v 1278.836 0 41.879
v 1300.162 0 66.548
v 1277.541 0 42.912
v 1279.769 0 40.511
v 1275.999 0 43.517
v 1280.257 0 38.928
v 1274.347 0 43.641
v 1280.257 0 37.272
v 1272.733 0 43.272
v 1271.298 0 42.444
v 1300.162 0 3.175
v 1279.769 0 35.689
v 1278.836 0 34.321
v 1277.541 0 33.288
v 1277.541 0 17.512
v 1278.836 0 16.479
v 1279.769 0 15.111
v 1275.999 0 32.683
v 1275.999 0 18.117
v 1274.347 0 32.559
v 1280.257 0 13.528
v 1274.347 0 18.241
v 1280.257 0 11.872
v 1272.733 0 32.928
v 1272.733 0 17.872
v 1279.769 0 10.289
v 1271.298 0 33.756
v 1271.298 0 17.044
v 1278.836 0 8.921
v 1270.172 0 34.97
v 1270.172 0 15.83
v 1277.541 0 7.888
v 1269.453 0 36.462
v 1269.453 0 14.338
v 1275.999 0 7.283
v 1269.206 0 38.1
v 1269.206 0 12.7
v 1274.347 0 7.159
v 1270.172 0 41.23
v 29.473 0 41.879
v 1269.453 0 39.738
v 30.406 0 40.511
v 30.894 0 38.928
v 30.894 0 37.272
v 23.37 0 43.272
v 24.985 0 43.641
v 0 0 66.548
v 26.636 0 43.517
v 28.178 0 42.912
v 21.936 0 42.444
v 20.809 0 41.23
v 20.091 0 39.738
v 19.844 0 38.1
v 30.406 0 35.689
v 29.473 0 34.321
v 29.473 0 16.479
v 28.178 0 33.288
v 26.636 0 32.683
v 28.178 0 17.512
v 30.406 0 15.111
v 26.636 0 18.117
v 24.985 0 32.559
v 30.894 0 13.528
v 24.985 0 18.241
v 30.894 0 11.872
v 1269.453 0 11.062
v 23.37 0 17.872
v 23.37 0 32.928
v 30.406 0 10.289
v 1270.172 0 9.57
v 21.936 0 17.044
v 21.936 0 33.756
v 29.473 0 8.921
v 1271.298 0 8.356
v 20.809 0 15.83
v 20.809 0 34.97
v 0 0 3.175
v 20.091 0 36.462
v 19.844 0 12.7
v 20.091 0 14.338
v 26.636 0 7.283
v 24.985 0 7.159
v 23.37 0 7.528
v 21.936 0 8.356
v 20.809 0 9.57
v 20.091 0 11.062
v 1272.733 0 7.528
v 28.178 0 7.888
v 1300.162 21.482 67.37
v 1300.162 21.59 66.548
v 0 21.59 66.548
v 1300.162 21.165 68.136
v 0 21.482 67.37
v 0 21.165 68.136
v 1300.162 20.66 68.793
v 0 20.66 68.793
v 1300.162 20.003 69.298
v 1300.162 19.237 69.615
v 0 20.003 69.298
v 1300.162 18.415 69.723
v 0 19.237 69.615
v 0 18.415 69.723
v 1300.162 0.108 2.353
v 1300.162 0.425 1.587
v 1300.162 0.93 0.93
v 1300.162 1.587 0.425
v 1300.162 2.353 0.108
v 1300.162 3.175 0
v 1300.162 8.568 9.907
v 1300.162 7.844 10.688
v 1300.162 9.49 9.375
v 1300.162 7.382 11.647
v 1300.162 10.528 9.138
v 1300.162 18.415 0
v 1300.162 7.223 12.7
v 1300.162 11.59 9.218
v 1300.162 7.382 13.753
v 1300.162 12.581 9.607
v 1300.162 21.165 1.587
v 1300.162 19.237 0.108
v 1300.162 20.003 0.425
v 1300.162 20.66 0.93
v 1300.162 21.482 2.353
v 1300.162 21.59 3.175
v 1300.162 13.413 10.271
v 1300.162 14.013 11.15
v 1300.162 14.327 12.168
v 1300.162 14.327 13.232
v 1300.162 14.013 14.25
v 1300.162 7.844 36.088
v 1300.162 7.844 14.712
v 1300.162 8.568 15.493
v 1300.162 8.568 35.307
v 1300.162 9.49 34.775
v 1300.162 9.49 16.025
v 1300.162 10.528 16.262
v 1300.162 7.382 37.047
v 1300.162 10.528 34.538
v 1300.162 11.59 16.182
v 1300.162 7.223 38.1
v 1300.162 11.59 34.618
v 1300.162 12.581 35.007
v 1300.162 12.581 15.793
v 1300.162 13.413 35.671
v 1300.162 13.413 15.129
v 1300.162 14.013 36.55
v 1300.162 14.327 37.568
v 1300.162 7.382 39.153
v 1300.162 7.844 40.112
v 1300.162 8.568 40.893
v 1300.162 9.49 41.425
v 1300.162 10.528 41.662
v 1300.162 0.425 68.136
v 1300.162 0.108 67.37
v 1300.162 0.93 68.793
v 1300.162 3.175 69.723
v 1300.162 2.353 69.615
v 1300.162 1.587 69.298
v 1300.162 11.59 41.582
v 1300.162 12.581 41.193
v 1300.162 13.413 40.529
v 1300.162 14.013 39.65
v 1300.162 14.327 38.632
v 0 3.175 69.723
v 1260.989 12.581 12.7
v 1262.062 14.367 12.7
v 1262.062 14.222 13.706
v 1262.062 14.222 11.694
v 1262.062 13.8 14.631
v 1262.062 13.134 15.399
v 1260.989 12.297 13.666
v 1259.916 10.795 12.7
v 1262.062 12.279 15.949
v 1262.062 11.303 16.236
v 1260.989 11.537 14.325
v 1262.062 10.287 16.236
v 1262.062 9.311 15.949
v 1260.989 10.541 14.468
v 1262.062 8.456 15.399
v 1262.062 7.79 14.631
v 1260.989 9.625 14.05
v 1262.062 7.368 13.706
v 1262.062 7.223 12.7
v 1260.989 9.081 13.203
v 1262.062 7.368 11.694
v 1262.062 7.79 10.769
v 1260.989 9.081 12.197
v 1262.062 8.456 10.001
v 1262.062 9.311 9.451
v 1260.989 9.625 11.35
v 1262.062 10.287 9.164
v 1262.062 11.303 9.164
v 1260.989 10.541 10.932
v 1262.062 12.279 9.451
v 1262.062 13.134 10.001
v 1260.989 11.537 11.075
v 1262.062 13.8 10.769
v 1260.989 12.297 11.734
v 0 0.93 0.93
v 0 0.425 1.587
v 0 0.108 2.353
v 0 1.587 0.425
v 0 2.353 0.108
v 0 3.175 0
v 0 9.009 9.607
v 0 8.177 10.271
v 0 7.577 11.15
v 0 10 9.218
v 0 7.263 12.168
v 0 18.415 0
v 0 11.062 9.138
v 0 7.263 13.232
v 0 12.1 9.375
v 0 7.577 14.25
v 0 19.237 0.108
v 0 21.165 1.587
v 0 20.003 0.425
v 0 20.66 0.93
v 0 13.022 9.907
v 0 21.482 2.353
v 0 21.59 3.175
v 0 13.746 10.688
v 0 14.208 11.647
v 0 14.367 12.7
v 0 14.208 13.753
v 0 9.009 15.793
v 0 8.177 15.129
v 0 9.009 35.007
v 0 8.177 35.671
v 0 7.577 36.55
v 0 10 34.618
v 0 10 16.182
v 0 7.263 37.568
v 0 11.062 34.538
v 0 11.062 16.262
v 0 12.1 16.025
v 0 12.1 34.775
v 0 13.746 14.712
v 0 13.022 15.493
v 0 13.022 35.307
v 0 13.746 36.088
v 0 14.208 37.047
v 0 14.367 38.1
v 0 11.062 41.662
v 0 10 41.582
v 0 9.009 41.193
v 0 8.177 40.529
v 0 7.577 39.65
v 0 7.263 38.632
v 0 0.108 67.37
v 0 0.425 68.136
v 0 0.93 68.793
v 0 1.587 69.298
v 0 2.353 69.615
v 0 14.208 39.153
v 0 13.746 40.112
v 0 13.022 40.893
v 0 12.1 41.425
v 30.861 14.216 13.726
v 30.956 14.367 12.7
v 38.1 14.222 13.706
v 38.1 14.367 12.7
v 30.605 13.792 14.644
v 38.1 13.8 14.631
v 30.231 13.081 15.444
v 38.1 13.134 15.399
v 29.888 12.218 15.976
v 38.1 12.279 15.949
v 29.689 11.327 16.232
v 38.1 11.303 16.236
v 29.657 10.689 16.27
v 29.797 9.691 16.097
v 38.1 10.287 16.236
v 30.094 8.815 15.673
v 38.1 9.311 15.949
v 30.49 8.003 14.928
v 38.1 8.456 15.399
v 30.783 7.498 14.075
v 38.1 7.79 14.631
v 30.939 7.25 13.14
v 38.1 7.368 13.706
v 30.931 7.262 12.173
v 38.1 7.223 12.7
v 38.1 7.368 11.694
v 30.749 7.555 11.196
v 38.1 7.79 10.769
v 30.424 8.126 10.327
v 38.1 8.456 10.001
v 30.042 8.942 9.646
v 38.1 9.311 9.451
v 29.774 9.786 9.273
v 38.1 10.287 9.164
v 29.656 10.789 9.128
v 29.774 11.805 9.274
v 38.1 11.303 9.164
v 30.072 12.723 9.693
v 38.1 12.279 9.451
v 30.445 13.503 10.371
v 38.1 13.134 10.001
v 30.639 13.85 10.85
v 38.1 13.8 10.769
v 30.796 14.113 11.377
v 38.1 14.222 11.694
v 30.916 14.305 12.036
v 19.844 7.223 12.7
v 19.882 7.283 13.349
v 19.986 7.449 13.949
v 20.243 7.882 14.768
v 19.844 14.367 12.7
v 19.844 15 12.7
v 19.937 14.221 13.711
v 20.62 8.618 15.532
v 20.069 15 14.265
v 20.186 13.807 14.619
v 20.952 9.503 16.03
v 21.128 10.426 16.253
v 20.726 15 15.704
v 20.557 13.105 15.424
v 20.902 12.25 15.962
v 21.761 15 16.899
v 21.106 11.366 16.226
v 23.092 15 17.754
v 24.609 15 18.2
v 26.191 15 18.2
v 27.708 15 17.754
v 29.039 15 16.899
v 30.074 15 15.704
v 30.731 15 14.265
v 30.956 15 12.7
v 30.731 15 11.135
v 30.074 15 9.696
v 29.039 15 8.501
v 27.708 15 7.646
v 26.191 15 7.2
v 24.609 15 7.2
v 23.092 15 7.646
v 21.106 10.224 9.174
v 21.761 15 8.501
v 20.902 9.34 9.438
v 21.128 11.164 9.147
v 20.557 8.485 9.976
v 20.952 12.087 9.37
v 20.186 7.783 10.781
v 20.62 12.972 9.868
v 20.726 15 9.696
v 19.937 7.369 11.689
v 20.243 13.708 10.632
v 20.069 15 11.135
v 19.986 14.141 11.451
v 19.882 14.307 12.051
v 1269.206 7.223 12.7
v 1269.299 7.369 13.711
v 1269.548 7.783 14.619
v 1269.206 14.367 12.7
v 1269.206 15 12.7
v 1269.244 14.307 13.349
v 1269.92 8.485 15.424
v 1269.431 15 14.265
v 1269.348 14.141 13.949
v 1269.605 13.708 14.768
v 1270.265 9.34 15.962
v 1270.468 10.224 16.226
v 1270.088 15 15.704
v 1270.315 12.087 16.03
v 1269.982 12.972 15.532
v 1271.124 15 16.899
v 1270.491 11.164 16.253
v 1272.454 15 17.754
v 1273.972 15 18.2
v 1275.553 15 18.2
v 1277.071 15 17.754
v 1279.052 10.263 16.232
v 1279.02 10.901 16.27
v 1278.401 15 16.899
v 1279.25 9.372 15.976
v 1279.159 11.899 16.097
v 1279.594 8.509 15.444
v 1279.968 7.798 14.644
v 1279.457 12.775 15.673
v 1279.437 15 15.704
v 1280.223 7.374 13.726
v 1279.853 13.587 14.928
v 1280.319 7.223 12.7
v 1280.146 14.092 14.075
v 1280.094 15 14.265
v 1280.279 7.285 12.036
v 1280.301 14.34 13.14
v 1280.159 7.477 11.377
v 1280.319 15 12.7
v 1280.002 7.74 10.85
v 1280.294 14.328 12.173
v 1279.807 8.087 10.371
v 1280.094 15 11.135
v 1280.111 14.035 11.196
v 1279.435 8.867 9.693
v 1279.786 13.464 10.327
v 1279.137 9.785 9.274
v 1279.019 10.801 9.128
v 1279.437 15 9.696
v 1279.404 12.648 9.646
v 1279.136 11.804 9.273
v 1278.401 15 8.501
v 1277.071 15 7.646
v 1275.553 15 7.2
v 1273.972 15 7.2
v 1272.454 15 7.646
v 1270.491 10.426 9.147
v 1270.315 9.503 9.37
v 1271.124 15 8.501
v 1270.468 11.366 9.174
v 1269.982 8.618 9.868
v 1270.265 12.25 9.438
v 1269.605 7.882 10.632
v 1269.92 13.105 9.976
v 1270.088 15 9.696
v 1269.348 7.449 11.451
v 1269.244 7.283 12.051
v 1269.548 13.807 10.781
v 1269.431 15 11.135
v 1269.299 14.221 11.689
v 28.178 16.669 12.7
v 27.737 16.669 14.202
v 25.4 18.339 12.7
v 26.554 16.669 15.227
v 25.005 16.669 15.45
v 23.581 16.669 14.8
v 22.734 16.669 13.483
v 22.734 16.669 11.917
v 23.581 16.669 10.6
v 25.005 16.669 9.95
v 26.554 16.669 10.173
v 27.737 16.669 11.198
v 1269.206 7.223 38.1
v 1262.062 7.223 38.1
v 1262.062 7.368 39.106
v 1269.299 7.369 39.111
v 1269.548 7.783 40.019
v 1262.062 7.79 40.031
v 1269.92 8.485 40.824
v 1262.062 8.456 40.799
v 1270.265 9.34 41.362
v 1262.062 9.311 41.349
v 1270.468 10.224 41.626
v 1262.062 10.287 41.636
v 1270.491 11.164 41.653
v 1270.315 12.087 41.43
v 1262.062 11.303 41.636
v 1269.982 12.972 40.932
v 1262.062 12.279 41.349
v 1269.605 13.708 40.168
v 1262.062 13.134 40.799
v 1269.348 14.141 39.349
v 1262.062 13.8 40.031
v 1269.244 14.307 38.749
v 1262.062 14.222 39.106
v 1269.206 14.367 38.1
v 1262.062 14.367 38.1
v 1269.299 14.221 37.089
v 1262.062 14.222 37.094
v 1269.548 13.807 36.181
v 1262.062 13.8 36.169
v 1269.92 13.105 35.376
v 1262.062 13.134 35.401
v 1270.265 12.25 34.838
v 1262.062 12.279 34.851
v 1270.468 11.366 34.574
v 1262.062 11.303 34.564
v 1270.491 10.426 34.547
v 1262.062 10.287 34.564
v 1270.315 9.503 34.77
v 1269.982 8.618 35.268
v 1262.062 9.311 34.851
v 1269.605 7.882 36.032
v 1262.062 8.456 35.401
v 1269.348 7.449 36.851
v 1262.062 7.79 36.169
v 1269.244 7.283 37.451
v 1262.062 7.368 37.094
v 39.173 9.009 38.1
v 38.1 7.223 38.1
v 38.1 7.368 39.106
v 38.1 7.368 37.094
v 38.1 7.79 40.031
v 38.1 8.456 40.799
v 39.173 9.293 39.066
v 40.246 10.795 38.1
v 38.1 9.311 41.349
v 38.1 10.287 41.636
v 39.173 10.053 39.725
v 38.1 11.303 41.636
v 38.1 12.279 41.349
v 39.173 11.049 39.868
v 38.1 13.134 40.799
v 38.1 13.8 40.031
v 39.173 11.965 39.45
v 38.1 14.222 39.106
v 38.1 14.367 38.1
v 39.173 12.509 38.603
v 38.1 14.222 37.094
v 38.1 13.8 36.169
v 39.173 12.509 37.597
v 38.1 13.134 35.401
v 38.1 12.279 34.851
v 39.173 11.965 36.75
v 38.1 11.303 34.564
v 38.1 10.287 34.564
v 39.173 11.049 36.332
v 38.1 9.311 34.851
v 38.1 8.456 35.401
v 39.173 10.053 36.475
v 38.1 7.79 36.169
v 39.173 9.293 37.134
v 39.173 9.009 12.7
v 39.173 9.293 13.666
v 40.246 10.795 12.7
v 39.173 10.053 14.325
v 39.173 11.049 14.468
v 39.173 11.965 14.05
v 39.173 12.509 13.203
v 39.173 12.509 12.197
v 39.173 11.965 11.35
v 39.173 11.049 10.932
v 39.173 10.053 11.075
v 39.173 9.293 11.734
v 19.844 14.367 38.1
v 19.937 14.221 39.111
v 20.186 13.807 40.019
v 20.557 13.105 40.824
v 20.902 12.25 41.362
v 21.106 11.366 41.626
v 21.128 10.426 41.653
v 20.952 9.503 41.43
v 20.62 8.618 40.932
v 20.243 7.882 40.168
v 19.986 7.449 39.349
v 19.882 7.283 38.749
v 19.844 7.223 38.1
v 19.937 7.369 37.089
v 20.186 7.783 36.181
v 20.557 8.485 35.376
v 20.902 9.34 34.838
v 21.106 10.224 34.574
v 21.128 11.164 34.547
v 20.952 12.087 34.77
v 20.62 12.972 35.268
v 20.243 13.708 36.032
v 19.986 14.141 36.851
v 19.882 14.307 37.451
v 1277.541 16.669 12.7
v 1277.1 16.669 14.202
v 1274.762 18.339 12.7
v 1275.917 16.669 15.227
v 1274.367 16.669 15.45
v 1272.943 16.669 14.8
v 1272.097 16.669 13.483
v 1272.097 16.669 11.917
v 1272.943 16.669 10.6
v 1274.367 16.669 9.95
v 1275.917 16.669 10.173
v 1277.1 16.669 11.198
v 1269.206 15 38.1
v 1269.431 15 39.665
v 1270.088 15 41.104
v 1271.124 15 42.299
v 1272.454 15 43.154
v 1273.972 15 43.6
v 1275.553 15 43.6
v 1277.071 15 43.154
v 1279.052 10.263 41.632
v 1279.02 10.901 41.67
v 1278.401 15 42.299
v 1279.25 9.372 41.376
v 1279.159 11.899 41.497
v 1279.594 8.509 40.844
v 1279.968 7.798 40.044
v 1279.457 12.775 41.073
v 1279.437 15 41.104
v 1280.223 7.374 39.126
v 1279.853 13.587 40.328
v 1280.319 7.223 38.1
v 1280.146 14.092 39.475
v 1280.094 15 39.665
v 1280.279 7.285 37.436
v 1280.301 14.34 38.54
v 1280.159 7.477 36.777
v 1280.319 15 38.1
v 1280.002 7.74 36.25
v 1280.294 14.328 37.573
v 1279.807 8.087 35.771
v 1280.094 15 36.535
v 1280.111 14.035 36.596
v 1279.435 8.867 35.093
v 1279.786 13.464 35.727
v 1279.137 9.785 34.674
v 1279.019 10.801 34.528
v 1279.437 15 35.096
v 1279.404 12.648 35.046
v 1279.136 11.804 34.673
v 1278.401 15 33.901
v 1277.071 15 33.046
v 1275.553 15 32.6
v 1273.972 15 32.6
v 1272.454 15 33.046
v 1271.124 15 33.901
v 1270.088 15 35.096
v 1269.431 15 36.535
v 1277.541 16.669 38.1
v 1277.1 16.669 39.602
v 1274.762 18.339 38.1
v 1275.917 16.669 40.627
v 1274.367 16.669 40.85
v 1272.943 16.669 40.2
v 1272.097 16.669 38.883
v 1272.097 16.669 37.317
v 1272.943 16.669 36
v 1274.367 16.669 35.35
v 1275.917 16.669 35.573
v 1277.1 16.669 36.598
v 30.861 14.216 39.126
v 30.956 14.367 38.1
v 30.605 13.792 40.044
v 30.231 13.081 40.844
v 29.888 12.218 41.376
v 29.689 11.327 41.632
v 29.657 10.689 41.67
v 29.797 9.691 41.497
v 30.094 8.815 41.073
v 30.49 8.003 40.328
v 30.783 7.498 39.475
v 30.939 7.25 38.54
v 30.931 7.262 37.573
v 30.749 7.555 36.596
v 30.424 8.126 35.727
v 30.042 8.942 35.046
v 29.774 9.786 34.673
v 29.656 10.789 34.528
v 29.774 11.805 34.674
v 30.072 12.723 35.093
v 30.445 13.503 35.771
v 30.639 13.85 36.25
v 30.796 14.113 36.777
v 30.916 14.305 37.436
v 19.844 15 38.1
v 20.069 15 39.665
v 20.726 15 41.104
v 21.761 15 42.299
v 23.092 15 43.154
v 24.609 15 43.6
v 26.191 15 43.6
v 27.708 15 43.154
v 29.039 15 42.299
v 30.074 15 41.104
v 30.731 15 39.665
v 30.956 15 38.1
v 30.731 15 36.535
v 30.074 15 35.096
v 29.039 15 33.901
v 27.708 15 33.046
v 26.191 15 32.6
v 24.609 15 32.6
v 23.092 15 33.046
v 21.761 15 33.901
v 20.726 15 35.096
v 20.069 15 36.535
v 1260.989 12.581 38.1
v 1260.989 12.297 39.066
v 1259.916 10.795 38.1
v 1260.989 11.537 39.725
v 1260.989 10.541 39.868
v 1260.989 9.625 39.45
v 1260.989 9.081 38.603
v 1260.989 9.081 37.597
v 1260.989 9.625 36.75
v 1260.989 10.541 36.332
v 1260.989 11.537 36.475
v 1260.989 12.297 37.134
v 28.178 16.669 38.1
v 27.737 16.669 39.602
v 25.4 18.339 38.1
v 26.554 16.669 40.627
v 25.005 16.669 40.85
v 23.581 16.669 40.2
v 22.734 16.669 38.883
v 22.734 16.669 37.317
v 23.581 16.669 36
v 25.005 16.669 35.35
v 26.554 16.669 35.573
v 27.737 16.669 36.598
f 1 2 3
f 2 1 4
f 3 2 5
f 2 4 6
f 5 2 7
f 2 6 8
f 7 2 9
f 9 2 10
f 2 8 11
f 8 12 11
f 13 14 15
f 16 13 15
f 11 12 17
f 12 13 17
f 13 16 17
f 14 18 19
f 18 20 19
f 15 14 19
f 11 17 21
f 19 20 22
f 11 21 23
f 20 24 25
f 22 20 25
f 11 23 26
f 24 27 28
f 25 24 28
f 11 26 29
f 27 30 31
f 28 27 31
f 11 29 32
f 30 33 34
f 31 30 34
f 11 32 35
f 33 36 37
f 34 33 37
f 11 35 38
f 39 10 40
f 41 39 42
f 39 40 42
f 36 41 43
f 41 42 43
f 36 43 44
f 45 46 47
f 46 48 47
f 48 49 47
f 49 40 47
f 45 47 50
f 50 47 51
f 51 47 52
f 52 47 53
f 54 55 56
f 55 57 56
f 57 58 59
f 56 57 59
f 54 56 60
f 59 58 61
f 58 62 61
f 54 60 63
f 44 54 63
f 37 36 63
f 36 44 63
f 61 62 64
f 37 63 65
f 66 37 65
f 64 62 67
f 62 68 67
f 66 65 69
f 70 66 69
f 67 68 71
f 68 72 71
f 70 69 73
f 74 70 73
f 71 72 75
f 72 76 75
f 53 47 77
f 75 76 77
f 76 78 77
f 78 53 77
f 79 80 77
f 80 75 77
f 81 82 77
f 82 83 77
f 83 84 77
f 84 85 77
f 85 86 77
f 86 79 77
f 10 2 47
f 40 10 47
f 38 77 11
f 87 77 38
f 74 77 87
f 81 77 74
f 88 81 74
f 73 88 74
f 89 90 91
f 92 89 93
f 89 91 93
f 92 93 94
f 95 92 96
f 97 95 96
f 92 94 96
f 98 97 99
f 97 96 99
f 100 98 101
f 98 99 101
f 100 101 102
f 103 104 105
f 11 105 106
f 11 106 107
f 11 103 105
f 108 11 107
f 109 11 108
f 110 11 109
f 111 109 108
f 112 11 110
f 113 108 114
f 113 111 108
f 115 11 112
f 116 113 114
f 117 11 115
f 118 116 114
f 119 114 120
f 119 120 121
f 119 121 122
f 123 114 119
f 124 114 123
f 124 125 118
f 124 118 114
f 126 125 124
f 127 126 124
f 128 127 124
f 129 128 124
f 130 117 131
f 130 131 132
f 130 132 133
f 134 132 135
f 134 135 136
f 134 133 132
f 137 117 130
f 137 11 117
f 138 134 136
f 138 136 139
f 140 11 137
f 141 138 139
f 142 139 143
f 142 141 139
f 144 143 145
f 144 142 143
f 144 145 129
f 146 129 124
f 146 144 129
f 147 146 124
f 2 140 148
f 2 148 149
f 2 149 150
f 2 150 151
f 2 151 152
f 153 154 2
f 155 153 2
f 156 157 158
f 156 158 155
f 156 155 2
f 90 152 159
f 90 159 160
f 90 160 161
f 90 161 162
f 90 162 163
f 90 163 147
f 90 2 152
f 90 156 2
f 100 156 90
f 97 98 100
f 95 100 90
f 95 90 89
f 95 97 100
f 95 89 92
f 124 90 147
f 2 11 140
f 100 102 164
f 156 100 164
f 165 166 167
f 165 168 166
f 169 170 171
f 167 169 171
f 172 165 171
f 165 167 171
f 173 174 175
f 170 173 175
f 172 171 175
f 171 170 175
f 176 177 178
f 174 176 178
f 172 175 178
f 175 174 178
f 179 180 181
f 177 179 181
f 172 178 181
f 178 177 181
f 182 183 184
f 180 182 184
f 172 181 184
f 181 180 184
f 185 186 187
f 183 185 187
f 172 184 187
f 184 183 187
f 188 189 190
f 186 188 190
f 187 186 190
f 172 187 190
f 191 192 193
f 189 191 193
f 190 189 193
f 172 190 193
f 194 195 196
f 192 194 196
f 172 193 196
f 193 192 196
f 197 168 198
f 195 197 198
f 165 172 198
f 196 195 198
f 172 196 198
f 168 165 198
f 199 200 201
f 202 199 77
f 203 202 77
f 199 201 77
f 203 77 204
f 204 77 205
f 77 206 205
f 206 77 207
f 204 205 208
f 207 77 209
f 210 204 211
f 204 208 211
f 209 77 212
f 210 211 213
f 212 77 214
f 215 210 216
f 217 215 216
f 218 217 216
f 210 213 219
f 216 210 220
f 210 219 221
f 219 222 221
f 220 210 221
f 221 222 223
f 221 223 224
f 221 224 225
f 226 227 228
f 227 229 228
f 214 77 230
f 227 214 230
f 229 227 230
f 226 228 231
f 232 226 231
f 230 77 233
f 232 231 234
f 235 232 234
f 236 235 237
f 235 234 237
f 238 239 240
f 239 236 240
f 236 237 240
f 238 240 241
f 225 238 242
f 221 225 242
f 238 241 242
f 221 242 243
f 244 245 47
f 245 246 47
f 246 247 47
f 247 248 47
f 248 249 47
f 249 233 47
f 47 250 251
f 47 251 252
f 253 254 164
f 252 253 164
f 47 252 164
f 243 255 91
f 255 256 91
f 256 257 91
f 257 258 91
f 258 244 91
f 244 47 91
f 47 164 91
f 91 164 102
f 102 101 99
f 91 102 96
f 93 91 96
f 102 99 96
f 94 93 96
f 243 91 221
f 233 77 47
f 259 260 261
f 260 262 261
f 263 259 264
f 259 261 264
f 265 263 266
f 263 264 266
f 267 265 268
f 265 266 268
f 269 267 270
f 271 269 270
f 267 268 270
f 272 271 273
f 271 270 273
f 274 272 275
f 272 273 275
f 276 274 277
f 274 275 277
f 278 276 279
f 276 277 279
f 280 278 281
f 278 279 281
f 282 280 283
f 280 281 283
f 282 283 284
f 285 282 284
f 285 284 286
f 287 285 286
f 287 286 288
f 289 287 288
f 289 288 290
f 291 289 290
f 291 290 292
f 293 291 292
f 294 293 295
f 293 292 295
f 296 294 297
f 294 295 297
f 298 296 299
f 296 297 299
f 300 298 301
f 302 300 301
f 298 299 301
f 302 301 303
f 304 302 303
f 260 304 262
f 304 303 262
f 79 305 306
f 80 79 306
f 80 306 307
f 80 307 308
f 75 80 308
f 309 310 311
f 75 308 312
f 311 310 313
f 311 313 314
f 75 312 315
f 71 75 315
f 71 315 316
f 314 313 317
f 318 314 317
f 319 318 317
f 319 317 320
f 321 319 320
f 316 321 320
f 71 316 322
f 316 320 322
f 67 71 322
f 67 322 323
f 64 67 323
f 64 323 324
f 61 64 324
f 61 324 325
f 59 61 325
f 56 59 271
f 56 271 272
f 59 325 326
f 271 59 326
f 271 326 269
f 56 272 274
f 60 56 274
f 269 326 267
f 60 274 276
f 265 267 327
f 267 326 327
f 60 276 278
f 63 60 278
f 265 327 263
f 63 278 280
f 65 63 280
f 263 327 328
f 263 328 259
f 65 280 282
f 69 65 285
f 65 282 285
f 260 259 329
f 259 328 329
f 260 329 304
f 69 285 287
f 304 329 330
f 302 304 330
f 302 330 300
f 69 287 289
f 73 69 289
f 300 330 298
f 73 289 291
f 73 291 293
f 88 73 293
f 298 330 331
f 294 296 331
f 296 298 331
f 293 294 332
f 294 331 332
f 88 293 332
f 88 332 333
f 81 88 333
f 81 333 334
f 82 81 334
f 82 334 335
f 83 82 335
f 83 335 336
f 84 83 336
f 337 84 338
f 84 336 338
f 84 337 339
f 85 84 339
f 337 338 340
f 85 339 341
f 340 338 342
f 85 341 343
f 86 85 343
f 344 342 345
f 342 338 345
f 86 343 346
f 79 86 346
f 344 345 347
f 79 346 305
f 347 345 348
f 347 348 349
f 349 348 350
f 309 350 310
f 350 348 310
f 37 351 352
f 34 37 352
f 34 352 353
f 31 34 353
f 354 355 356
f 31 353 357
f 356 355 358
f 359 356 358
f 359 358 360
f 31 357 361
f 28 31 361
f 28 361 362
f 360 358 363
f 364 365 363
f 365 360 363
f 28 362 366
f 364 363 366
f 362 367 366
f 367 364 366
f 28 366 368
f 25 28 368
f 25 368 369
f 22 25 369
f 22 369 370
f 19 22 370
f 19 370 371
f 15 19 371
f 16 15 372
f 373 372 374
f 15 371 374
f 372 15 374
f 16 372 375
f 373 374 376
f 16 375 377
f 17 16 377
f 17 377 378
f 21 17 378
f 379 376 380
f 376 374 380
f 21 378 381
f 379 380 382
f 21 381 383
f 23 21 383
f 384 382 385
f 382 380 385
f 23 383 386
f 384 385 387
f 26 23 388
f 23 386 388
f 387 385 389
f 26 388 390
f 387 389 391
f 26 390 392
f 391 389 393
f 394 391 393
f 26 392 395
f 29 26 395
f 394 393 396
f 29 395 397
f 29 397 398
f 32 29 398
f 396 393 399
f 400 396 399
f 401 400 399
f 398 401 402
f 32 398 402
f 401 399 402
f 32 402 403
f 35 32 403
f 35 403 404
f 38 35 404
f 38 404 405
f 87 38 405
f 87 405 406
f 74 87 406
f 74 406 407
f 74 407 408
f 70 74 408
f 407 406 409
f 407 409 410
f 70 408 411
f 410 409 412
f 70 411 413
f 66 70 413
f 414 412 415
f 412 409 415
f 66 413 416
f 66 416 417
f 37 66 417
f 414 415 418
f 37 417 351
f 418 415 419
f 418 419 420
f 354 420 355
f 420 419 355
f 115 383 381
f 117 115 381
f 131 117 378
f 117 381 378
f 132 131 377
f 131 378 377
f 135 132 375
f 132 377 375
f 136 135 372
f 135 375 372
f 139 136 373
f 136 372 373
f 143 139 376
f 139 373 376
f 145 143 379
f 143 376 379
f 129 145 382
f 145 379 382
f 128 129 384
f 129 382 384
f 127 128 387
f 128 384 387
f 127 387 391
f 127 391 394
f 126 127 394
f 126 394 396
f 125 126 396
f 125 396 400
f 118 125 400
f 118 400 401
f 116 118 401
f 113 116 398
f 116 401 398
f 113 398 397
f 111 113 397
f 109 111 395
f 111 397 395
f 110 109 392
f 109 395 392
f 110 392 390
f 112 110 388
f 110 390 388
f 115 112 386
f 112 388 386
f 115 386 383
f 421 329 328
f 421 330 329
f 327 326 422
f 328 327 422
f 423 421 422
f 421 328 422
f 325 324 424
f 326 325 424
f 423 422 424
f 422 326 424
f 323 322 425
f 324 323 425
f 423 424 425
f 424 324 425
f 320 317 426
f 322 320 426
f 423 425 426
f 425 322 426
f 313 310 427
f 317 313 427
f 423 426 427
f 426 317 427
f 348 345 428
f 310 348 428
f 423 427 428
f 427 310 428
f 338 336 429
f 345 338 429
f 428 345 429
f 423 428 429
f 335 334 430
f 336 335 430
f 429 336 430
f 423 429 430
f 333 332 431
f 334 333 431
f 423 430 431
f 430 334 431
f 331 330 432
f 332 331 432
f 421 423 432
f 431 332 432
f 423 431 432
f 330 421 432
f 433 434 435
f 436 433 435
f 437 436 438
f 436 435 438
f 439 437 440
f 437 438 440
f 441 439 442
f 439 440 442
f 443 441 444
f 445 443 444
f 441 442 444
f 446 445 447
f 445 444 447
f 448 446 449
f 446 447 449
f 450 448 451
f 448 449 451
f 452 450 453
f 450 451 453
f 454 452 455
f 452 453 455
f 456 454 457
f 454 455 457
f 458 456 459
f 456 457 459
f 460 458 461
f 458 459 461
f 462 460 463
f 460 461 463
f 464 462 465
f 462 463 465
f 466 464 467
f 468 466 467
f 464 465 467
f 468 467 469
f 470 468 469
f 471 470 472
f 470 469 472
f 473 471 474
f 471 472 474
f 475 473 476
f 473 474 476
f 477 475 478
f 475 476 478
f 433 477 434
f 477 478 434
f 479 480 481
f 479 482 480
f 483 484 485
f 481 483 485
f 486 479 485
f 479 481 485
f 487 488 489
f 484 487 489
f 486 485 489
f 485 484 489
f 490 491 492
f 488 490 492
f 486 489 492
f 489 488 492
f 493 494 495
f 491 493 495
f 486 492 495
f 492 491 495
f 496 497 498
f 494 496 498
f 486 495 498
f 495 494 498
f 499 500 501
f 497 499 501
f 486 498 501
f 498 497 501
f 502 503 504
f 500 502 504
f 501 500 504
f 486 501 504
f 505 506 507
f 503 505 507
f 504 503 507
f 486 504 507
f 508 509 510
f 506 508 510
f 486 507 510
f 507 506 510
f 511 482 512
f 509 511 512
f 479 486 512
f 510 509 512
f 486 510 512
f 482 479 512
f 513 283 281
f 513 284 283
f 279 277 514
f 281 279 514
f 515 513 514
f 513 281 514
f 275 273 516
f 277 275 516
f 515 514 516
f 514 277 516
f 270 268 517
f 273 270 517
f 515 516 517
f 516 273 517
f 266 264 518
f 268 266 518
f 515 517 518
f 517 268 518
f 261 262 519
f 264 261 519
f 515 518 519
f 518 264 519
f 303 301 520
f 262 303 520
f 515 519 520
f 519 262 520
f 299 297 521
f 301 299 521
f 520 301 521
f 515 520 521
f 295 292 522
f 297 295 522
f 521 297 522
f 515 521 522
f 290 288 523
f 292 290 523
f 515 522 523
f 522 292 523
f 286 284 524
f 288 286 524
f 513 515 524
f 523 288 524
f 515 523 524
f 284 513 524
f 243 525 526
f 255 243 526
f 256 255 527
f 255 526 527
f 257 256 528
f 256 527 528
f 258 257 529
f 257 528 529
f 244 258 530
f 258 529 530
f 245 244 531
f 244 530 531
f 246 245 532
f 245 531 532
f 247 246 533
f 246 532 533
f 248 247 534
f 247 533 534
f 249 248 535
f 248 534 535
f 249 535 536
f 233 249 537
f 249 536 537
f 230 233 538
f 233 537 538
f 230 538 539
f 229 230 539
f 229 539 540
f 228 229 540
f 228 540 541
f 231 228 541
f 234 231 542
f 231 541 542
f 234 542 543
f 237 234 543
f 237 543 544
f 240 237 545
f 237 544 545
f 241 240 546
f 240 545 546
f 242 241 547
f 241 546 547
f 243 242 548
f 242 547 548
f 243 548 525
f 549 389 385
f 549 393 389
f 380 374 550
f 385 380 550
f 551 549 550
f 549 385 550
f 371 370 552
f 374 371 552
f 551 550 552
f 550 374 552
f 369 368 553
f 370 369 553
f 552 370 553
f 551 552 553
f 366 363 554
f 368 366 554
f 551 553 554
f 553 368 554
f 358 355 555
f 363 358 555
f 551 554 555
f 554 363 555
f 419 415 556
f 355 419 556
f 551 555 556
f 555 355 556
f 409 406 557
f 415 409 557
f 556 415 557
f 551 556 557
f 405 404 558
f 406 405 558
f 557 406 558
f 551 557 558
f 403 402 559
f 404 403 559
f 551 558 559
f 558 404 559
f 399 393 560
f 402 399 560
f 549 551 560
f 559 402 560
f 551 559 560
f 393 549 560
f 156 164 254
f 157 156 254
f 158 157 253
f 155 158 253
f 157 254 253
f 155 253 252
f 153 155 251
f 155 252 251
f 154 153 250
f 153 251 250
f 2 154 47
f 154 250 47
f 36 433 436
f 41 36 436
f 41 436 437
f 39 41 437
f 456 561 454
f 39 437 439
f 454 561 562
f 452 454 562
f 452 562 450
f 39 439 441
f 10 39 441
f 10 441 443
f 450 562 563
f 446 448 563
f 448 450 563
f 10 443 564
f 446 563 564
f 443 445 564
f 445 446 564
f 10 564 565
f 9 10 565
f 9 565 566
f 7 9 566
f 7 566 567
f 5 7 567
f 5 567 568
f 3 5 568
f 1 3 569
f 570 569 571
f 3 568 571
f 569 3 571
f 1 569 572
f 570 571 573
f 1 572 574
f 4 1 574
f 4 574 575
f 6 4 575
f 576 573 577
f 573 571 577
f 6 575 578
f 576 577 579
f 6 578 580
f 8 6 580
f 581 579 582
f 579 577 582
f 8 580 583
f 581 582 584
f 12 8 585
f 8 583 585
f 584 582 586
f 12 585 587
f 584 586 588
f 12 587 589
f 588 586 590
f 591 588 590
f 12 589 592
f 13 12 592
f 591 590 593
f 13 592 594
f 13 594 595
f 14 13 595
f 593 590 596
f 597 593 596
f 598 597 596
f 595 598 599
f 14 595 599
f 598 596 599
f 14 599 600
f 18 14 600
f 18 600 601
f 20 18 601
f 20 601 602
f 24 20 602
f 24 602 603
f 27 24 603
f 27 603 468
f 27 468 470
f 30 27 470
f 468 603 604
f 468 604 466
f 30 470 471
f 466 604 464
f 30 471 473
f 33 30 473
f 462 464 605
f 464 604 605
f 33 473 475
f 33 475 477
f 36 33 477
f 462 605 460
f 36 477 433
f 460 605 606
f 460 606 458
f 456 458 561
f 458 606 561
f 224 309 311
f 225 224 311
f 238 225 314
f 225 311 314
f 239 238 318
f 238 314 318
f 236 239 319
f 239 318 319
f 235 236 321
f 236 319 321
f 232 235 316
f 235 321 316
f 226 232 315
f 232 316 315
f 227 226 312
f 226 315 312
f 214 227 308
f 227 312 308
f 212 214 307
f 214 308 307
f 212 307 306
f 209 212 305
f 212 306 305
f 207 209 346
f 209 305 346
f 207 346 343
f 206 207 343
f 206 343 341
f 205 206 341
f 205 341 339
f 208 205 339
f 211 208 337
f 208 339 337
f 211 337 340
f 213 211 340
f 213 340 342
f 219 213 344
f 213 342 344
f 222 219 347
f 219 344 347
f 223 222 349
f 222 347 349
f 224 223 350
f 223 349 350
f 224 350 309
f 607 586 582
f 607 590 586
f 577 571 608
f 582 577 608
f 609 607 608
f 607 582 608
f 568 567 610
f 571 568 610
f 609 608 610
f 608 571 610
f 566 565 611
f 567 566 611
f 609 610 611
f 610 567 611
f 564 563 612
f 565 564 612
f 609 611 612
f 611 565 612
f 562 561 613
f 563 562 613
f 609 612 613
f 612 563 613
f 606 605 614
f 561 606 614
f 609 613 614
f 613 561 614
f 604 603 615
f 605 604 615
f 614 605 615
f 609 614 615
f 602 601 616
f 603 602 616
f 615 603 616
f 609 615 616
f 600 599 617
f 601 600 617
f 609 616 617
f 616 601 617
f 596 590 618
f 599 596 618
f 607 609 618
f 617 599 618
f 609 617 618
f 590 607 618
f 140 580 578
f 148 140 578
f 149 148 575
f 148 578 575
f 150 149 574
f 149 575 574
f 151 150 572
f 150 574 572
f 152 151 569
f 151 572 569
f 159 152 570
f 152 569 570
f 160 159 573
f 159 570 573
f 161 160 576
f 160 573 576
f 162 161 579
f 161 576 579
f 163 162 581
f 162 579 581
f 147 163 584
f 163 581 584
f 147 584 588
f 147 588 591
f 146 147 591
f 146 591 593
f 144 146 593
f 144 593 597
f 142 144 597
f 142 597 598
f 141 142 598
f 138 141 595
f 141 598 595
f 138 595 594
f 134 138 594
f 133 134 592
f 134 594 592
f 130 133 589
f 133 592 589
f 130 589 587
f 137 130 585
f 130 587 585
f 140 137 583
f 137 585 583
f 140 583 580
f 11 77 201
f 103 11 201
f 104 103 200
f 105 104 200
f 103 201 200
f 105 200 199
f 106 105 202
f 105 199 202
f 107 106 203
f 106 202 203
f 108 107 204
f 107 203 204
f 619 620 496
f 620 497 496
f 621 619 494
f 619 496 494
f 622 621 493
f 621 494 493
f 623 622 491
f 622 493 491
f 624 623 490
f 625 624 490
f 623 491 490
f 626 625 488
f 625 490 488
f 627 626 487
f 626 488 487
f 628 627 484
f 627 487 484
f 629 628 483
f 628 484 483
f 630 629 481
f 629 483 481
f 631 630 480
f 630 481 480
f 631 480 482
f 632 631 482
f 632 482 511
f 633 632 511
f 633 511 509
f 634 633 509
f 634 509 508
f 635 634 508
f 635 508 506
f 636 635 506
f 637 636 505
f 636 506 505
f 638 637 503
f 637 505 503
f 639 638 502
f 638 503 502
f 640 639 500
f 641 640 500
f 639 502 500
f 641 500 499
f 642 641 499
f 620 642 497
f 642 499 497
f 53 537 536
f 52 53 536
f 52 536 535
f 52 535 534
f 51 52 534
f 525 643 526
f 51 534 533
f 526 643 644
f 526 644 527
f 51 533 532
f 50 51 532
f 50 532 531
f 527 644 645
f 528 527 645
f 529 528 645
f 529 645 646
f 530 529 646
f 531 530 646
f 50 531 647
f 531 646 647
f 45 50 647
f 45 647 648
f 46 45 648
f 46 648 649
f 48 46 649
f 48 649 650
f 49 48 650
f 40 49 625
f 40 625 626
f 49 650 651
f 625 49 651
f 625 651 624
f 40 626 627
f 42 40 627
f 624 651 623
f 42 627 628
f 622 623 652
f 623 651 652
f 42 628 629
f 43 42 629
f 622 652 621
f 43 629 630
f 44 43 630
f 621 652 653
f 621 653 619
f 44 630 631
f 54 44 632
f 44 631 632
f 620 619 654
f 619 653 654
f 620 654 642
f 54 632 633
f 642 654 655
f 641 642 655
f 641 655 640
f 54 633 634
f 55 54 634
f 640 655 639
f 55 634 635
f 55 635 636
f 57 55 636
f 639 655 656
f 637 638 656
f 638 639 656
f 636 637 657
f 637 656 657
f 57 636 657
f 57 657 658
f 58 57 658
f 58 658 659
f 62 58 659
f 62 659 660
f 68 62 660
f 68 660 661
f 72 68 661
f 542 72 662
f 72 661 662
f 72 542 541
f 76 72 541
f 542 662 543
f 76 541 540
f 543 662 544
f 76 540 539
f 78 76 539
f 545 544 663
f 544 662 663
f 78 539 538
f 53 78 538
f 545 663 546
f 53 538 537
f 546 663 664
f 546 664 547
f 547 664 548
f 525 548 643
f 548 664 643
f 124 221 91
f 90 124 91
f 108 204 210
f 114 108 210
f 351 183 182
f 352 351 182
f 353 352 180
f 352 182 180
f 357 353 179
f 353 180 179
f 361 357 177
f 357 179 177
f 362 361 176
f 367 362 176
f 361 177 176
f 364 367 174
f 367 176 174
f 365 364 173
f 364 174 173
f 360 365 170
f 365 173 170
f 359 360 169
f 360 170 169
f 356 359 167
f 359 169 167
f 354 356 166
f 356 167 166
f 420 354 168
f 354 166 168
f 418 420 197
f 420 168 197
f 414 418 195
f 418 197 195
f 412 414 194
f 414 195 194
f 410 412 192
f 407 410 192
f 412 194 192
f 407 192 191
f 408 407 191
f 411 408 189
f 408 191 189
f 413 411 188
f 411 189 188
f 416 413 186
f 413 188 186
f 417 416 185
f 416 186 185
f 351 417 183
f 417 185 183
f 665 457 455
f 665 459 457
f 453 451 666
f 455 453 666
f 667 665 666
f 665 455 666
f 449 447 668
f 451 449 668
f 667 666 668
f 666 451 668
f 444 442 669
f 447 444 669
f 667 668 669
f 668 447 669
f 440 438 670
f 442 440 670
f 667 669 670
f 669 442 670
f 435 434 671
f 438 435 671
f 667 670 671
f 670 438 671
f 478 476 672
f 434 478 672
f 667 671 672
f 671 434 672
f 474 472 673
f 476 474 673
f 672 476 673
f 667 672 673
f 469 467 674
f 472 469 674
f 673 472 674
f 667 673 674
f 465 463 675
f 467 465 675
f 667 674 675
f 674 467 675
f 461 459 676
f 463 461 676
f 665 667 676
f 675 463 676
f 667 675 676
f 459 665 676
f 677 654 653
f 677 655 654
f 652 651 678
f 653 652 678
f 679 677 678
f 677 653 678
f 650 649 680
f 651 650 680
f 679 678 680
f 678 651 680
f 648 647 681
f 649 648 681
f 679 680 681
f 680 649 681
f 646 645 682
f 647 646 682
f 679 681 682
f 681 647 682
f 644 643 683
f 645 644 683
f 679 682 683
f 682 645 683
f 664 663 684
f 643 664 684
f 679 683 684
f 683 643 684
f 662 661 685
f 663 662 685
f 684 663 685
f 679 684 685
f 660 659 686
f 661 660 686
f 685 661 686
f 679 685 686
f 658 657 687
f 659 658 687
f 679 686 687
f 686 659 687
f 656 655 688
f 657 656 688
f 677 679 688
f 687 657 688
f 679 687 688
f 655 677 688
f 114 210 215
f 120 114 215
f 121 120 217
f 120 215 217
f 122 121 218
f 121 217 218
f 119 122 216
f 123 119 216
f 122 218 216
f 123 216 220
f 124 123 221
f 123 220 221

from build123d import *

# Parameters (mm, degrees)
F1_DEPTH       = 1300.1625
F4_D           = 7.14375
F4_DEPTH       = 38.1
F4_TIP         = 2.1461990236
F4_ON_F2_D     = 7.14375
F4_ON_F2_DEPTH = 38.1
F4_ON_F2_TIP   = 2.1461990236
F6_D           = 11.1125
F6_DEPTH       = 15
F6_TIP         = 3.3385318145


with BuildPart() as f1:
    # F0 (on Right) → F1 (new body)
    with BuildSketch(Plane.YZ):
        with BuildLine():
            Line((3.175, 0), (18.415, 0))
            ThreePointArc((18.415, 0), (20.6600640303, 0.9299359697), (21.59, 3.175))
            Line((21.59, 3.175), (21.59, 66.548))
            ThreePointArc((21.59, 66.548), (20.6600640303, 68.7930640303), (18.415, 69.723))
            Line((18.415, 69.723), (3.175, 69.723))
            ThreePointArc((3.175, 69.723), (0.9299359697, 68.7930640303), (0, 66.548))
            Line((0, 66.548), (0, 3.175))
            ThreePointArc((0, 3.175), (0.9299359697, 0.9299359697), (3.175, 0))
        make_face()
    extrude(amount=F1_DEPTH)

    # F4
    with Locations(Plane.YZ.offset(1300.1625)):
        with Locations((10.795, 38.1), (10.795, 12.7)):
            Hole(F4_D / 2, depth=F4_DEPTH)
            with Locations((0, 0, -(F4_DEPTH + F4_TIP / 2))):  # 118° drill point
                Cone(0, F4_D / 2, F4_TIP, mode=Mode.SUBTRACT)

    # F4 on F2
    with Locations(Plane(origin=(0, 0, 0), x_dir=(0, -1, 0), z_dir=(-1, 0, 0))):
        with Locations((-10.795, 38.1), (-10.795, 12.7)):
            Hole(F4_ON_F2_D / 2, depth=F4_ON_F2_DEPTH)
            with Locations((0, 0, -(F4_ON_F2_DEPTH + F4_ON_F2_TIP / 2))):  # 118° drill point
                Cone(0, F4_ON_F2_D / 2, F4_ON_F2_TIP, mode=Mode.SUBTRACT)

    # F6
    with Locations(Plane.XZ):
        with Locations((25.4, 38.1), (25.4, 12.7), (1274.7625, 38.1), (1274.7625, 12.7)):
            Hole(F6_D / 2, depth=F6_DEPTH)
            with Locations((0, 0, -(F6_DEPTH + F6_TIP / 2))):  # 118° drill point
                Cone(0, F6_D / 2, F6_TIP, mode=Mode.SUBTRACT)


solid = f1.part
